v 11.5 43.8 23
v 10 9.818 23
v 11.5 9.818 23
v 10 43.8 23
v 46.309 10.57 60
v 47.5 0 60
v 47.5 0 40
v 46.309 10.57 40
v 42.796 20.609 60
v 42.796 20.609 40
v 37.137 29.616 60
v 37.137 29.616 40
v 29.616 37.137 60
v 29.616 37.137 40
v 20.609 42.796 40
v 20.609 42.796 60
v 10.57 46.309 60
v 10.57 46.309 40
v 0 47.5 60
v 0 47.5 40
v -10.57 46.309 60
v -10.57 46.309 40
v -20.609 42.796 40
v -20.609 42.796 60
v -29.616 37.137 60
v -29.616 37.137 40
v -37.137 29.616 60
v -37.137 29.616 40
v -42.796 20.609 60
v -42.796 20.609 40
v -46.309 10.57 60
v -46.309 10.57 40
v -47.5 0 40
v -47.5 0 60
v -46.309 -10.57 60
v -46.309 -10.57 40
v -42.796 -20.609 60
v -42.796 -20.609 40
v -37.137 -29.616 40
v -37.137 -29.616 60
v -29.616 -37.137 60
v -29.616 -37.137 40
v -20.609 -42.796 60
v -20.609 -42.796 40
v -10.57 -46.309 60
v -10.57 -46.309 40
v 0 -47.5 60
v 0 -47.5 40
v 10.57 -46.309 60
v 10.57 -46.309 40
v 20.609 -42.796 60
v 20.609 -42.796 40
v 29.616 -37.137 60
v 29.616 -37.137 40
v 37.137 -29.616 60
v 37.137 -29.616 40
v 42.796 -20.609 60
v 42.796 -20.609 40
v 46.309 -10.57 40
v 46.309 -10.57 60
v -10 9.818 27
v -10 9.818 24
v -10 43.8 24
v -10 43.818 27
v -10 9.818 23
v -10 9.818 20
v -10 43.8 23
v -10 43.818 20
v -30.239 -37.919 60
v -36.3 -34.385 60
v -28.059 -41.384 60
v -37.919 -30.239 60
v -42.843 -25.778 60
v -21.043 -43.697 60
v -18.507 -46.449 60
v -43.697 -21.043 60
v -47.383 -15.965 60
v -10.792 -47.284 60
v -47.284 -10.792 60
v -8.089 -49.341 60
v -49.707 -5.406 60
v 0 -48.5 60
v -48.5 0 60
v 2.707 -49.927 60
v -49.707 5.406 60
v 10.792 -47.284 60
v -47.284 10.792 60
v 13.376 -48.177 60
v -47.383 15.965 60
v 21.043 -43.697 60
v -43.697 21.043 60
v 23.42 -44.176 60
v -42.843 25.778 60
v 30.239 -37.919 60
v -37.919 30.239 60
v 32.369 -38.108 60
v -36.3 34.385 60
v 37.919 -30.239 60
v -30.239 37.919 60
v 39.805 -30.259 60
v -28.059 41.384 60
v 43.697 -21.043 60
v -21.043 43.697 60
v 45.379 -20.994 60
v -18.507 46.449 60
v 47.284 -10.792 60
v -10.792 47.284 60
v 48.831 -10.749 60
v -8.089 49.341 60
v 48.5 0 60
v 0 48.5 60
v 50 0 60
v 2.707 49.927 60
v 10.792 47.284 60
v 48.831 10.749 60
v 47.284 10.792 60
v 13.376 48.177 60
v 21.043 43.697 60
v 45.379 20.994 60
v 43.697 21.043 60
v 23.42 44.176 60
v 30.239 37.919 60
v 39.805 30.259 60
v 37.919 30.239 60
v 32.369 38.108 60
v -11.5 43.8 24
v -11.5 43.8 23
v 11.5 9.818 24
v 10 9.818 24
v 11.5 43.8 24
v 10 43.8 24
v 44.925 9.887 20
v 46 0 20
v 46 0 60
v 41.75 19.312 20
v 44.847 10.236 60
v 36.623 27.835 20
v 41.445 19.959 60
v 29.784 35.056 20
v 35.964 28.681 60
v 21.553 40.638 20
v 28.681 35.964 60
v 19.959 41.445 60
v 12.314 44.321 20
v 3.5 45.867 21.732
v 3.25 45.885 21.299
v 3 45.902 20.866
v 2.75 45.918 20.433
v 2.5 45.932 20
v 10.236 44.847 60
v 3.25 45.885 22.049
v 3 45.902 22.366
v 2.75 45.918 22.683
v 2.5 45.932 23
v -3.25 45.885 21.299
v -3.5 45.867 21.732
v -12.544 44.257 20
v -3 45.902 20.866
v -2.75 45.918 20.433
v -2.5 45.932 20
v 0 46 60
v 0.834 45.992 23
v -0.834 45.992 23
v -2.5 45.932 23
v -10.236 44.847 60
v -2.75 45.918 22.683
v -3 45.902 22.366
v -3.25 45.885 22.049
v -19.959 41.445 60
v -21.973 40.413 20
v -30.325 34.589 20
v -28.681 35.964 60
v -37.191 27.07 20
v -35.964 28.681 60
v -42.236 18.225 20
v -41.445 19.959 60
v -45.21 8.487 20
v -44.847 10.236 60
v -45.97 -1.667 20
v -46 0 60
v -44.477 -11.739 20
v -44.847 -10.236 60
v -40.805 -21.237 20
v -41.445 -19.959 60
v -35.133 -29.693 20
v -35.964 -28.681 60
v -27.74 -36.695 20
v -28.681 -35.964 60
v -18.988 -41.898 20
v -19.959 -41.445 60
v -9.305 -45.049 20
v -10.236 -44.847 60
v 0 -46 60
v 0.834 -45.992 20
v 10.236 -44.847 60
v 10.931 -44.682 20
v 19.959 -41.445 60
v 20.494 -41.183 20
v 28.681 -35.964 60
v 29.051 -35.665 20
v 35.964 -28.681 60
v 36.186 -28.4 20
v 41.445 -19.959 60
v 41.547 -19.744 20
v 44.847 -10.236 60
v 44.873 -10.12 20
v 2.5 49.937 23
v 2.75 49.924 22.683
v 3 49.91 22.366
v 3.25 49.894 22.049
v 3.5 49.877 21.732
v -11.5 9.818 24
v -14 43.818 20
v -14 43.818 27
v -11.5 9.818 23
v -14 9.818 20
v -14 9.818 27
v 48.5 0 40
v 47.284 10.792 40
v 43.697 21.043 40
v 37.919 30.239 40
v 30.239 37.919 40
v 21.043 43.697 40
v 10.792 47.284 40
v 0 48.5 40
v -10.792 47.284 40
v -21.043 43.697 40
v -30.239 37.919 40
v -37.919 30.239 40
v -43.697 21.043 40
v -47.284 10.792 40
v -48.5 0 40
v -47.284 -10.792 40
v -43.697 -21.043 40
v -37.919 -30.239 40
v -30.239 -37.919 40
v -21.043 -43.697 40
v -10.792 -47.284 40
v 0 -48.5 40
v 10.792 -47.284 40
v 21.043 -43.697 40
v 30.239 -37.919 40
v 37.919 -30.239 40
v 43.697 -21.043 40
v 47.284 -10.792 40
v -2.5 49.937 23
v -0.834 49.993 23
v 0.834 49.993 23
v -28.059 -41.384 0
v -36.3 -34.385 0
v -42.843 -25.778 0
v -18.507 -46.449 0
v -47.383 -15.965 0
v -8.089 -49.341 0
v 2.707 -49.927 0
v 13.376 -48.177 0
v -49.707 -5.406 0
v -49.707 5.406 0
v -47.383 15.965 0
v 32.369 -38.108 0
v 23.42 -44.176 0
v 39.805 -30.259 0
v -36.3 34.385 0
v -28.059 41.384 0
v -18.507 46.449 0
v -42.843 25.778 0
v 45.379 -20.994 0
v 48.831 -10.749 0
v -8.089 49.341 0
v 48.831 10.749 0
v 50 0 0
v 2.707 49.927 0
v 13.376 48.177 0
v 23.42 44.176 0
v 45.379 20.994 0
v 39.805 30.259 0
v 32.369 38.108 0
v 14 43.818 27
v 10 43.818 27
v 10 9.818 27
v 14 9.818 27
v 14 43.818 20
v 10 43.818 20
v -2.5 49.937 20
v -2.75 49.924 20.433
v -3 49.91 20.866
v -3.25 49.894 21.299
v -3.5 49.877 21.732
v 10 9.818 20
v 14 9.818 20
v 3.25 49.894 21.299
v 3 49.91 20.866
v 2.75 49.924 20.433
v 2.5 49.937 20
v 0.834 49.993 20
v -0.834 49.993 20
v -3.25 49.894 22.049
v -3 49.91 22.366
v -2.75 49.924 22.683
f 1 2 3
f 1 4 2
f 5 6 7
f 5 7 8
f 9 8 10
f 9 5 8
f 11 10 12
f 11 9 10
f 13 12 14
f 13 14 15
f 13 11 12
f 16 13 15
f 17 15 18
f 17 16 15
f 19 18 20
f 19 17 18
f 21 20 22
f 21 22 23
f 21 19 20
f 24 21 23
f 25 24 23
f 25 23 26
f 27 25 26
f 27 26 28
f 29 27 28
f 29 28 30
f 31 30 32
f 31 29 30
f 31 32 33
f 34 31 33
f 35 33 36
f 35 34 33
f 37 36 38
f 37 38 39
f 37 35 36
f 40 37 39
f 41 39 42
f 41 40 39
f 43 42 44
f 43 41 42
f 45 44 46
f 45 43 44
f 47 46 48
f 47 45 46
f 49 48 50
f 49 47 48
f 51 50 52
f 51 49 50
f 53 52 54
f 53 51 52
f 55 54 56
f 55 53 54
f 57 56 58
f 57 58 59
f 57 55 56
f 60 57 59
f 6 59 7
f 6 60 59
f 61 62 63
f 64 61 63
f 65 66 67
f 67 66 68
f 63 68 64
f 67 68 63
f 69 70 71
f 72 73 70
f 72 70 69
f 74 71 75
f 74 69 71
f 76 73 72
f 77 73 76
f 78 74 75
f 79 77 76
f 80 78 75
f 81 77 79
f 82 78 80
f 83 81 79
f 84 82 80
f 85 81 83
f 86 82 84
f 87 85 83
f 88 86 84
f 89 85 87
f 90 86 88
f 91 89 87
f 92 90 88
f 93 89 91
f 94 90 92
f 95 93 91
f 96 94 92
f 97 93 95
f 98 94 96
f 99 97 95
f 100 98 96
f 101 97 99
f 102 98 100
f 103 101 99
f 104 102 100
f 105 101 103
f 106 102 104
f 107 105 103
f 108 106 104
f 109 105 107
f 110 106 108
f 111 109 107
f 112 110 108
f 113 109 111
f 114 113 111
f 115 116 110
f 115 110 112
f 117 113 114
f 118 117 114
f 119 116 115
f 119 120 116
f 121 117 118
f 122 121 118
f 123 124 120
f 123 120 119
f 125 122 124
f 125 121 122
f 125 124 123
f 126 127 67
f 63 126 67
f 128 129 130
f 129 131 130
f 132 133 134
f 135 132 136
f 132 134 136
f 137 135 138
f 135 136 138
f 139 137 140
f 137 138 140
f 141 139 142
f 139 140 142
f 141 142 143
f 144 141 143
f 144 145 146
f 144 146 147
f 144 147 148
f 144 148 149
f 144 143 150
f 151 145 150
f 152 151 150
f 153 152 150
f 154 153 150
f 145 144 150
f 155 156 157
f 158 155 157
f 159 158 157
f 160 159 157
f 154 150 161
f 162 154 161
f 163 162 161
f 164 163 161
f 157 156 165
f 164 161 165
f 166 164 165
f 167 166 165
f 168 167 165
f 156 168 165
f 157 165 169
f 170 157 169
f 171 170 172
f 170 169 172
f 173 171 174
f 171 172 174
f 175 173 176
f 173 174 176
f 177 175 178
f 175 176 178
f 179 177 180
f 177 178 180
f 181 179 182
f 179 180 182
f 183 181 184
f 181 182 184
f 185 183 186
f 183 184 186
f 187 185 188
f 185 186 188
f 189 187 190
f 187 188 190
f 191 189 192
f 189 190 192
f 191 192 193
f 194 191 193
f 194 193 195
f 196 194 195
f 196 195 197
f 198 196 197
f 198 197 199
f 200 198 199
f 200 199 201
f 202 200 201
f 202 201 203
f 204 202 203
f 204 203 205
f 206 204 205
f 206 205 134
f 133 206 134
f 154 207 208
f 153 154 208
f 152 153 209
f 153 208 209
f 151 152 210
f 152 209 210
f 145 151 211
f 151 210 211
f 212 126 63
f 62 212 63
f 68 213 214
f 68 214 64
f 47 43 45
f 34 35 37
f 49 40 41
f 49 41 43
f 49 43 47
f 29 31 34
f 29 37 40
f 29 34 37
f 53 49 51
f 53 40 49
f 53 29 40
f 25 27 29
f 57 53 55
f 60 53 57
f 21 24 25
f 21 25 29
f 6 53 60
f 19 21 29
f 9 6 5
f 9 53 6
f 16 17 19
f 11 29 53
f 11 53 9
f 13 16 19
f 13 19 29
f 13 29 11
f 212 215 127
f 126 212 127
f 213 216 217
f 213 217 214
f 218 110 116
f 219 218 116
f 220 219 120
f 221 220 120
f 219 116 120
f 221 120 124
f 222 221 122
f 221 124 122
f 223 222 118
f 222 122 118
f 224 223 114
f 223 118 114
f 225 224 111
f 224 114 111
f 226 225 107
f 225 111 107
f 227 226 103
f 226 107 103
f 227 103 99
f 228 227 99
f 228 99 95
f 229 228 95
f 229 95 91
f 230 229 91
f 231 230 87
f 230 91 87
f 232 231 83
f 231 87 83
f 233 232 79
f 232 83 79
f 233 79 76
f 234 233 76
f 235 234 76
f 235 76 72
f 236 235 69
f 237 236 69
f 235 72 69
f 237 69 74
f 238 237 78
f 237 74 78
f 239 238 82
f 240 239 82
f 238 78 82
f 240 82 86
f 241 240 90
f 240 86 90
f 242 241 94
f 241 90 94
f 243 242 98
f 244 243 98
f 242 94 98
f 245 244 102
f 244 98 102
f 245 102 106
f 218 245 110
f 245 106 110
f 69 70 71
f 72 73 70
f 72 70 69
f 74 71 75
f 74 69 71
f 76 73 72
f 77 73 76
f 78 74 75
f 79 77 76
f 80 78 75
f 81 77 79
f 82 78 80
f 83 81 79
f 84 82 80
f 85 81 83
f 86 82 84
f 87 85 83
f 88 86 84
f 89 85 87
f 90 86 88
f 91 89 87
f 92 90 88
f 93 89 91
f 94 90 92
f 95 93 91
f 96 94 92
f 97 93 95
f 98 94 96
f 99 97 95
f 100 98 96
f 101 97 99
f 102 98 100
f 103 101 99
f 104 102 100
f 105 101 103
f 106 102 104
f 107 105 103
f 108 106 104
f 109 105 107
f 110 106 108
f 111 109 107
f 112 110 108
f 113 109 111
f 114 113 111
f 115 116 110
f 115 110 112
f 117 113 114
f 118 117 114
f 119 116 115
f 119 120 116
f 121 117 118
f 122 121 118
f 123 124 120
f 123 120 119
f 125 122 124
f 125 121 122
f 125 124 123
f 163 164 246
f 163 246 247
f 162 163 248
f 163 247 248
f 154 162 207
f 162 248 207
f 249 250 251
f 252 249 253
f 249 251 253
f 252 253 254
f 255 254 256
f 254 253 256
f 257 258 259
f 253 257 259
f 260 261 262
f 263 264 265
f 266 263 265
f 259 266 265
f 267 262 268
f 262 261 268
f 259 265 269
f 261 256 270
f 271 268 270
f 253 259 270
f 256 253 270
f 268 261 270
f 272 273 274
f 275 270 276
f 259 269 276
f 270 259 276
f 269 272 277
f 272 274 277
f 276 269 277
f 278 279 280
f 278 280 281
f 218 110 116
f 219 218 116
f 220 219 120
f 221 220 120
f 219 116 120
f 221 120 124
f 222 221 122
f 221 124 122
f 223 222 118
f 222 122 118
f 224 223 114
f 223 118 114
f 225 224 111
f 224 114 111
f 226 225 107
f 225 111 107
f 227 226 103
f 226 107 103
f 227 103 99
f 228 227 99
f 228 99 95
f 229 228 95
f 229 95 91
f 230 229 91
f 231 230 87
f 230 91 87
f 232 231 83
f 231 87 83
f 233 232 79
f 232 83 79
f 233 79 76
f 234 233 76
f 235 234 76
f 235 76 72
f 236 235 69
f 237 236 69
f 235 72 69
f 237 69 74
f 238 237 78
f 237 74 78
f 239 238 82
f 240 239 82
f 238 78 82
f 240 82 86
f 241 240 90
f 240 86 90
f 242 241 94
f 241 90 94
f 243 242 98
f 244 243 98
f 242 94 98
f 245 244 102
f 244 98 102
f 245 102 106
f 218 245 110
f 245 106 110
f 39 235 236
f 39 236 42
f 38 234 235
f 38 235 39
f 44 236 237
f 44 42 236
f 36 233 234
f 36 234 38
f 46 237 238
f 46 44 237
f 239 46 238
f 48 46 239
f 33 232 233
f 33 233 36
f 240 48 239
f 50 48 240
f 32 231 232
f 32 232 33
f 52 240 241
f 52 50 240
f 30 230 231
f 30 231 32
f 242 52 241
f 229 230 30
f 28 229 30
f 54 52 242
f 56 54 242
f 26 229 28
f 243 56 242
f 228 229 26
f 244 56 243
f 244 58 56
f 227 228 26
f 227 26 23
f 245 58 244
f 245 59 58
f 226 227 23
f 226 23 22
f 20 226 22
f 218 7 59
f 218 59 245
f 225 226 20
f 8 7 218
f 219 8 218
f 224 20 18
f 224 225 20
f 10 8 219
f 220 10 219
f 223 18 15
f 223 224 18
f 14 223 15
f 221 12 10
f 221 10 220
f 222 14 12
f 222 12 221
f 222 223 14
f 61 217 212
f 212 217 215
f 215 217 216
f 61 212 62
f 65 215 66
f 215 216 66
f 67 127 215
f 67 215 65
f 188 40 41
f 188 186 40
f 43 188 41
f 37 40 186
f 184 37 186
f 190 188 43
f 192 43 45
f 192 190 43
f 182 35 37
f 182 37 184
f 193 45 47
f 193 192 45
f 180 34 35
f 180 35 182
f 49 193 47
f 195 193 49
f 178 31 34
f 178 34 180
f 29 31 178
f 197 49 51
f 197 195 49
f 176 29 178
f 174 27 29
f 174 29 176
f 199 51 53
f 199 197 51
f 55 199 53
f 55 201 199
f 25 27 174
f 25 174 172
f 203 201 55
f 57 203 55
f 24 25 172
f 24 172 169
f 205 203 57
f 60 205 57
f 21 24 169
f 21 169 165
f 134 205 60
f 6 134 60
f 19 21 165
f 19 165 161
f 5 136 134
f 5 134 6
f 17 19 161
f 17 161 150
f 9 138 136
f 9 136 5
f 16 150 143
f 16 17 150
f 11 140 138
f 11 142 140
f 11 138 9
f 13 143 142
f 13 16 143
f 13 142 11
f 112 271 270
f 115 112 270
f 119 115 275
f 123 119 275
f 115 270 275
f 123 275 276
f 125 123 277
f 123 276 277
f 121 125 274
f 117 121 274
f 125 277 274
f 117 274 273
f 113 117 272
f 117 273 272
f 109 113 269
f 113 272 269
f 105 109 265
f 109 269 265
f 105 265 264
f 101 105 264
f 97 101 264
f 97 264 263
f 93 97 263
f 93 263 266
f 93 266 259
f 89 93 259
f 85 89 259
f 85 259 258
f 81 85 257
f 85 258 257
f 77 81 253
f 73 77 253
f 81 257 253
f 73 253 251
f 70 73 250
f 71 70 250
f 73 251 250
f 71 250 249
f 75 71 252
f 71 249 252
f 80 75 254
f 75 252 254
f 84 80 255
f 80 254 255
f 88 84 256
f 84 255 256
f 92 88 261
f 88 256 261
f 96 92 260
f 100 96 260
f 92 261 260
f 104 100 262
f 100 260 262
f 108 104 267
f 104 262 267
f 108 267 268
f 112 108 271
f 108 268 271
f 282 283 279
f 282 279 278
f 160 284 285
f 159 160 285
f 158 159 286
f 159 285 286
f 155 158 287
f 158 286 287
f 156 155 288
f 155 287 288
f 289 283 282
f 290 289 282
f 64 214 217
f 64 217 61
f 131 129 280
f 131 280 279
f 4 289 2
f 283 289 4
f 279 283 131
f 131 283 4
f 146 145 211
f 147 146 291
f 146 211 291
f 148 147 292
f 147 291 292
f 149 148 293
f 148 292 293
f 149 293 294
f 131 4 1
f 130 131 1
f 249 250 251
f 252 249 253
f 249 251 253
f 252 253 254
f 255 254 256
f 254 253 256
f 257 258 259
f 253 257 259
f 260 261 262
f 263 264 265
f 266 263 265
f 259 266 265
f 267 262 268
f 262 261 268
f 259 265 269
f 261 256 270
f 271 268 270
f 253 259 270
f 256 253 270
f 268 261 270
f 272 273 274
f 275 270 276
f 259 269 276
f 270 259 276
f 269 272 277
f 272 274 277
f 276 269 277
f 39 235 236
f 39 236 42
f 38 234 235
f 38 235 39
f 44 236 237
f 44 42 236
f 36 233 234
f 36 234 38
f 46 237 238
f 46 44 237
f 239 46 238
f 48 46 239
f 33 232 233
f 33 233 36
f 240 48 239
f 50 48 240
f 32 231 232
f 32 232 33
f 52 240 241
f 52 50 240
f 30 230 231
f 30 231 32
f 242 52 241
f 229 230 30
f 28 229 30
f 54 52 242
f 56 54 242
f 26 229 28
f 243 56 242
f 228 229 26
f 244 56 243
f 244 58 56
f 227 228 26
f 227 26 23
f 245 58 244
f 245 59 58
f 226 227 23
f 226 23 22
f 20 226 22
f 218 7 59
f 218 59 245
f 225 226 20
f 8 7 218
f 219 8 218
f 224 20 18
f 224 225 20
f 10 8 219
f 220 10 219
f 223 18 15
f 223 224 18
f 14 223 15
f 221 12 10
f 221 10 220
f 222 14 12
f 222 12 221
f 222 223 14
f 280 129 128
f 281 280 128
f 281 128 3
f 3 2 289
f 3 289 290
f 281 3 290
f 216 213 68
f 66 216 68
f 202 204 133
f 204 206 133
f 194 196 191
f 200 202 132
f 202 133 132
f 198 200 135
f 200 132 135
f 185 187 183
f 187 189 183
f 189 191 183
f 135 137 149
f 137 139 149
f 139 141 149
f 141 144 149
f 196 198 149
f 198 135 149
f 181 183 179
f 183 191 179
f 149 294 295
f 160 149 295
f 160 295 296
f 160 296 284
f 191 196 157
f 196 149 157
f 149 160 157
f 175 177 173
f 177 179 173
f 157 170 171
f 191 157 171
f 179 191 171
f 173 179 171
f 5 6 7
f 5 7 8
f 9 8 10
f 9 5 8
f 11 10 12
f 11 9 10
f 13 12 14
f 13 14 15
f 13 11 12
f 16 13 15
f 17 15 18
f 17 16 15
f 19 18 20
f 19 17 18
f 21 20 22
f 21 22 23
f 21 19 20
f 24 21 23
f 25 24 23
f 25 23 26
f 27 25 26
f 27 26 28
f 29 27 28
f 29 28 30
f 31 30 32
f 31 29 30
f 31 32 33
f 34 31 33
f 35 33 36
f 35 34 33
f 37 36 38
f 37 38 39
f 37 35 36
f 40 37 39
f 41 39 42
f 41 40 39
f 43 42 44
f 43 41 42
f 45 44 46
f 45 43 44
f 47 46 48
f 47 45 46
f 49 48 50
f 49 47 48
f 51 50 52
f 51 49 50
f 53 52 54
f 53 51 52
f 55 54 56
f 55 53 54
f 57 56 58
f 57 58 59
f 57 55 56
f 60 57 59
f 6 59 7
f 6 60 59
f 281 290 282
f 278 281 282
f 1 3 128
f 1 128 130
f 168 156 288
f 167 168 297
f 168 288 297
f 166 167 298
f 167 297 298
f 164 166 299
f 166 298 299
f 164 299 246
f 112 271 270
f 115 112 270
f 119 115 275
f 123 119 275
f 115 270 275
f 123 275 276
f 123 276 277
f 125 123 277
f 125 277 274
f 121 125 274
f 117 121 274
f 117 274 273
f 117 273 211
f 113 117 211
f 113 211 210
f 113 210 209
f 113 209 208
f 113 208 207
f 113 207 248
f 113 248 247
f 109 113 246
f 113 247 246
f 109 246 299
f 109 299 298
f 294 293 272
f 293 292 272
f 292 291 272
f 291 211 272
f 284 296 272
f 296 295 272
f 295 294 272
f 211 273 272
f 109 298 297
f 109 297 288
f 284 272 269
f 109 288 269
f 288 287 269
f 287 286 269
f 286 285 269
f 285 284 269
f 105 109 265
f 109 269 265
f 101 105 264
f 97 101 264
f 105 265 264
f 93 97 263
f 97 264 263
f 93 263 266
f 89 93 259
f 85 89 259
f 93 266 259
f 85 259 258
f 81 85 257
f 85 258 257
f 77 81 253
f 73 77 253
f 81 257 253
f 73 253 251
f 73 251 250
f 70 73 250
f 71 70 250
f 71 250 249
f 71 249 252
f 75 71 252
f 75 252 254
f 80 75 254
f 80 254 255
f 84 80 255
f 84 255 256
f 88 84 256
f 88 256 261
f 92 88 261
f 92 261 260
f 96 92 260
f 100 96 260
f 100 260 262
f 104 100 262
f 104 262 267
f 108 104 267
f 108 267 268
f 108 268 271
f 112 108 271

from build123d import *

# Parameters (mm, degrees)
SKETCH001_R      = 48.5
SKETCH001_R_2    = 47.5
EXTRUDE001_DEPTH = 20
SKETCH_R         = 50
EXTRUDE_DEPTH    = 60
EXTRUDE003_DEPTH = 4.5
SKETCH002_R      = 46
EXTRUDE002_DEPTH = 40
BOX_W            = 23
BOX_H            = 34
BOX_DEPTH        = 1
SKETCH004_W      = 4
SKETCH004_H      = 34
EXTRUDE004_DEPTH = 7


with BuildPart() as extrude001:
    # Sketch001 (on Face3 of Extrude) → Extrude001 (new body)
    with BuildSketch(Plane.XY.offset(60)):
        Circle(SKETCH001_R)
        Circle(SKETCH001_R_2, mode=Mode.SUBTRACT)
    extrude(amount=-EXTRUDE001_DEPTH)


with BuildPart() as extrude_body:
    # Sketch → Extrude (new body)
    with BuildSketch(Plane.XY):
        Circle(SKETCH_R)
    extrude(amount=EXTRUDE_DEPTH)


with BuildPart() as cut:
    # Cut base: copy of Extrude body
    add(extrude_body.part)

    # Cut: cut Extrude001
    add(extrude001.part, mode=Mode.SUBTRACT)


with BuildPart() as extrude003:
    # Sketch003 → Extrude003 (new body)
    with BuildSketch(Plane.XZ.offset(-50)):
        Polygon((-2.5, 23), (2.5, 23), (3.5, 21.732051), (2.5, 20), (-2.5, 20), (-3.5, 21.732051), align=None)
    extrude(amount=EXTRUDE003_DEPTH)


with BuildPart() as extrude002:
    # Sketch002 (on Face7 of Cut) → Extrude002 (new body)
    with BuildSketch(Plane.XY.offset(60)):
        Circle(SKETCH002_R)
    extrude(amount=-EXTRUDE002_DEPTH)


with BuildPart() as cut003:
    # Cut001 base: copy of Extrude body
    add(extrude_body.part)

    # Cut001: cut Extrude001
    add(extrude001.part, mode=Mode.SUBTRACT)

    # Cut002: cut Extrude002
    add(extrude002.part, mode=Mode.SUBTRACT)

    # Cut003: cut Extrude003
    add(extrude003.part, mode=Mode.SUBTRACT)


with BuildPart() as box:
    # Box → Box (new body)
    with BuildSketch(Plane(origin=(-11.5, 9.8, 23), x_dir=(1, 0, 0), z_dir=(0, 0, 1))):
        with Locations((11.5, 17)):
            Rectangle(BOX_W, BOX_H)
    extrude(amount=BOX_DEPTH)


with BuildPart() as cut004:
    # Sketch004 (on Face14 of Cut003) → Extrude004 (new body)
    with BuildSketch(Plane.XY.offset(20)):
        with Locations((-12, 26.817805)):
            Rectangle(SKETCH004_W, SKETCH004_H)
        with Locations((12, 26.817805)):
            Rectangle(SKETCH004_W, SKETCH004_H)
    extrude(amount=EXTRUDE004_DEPTH)

    # Cut004: cut Box
    add(box.part, mode=Mode.SUBTRACT)


solid = Compound([cut.part, cut003.part, cut004.part])
